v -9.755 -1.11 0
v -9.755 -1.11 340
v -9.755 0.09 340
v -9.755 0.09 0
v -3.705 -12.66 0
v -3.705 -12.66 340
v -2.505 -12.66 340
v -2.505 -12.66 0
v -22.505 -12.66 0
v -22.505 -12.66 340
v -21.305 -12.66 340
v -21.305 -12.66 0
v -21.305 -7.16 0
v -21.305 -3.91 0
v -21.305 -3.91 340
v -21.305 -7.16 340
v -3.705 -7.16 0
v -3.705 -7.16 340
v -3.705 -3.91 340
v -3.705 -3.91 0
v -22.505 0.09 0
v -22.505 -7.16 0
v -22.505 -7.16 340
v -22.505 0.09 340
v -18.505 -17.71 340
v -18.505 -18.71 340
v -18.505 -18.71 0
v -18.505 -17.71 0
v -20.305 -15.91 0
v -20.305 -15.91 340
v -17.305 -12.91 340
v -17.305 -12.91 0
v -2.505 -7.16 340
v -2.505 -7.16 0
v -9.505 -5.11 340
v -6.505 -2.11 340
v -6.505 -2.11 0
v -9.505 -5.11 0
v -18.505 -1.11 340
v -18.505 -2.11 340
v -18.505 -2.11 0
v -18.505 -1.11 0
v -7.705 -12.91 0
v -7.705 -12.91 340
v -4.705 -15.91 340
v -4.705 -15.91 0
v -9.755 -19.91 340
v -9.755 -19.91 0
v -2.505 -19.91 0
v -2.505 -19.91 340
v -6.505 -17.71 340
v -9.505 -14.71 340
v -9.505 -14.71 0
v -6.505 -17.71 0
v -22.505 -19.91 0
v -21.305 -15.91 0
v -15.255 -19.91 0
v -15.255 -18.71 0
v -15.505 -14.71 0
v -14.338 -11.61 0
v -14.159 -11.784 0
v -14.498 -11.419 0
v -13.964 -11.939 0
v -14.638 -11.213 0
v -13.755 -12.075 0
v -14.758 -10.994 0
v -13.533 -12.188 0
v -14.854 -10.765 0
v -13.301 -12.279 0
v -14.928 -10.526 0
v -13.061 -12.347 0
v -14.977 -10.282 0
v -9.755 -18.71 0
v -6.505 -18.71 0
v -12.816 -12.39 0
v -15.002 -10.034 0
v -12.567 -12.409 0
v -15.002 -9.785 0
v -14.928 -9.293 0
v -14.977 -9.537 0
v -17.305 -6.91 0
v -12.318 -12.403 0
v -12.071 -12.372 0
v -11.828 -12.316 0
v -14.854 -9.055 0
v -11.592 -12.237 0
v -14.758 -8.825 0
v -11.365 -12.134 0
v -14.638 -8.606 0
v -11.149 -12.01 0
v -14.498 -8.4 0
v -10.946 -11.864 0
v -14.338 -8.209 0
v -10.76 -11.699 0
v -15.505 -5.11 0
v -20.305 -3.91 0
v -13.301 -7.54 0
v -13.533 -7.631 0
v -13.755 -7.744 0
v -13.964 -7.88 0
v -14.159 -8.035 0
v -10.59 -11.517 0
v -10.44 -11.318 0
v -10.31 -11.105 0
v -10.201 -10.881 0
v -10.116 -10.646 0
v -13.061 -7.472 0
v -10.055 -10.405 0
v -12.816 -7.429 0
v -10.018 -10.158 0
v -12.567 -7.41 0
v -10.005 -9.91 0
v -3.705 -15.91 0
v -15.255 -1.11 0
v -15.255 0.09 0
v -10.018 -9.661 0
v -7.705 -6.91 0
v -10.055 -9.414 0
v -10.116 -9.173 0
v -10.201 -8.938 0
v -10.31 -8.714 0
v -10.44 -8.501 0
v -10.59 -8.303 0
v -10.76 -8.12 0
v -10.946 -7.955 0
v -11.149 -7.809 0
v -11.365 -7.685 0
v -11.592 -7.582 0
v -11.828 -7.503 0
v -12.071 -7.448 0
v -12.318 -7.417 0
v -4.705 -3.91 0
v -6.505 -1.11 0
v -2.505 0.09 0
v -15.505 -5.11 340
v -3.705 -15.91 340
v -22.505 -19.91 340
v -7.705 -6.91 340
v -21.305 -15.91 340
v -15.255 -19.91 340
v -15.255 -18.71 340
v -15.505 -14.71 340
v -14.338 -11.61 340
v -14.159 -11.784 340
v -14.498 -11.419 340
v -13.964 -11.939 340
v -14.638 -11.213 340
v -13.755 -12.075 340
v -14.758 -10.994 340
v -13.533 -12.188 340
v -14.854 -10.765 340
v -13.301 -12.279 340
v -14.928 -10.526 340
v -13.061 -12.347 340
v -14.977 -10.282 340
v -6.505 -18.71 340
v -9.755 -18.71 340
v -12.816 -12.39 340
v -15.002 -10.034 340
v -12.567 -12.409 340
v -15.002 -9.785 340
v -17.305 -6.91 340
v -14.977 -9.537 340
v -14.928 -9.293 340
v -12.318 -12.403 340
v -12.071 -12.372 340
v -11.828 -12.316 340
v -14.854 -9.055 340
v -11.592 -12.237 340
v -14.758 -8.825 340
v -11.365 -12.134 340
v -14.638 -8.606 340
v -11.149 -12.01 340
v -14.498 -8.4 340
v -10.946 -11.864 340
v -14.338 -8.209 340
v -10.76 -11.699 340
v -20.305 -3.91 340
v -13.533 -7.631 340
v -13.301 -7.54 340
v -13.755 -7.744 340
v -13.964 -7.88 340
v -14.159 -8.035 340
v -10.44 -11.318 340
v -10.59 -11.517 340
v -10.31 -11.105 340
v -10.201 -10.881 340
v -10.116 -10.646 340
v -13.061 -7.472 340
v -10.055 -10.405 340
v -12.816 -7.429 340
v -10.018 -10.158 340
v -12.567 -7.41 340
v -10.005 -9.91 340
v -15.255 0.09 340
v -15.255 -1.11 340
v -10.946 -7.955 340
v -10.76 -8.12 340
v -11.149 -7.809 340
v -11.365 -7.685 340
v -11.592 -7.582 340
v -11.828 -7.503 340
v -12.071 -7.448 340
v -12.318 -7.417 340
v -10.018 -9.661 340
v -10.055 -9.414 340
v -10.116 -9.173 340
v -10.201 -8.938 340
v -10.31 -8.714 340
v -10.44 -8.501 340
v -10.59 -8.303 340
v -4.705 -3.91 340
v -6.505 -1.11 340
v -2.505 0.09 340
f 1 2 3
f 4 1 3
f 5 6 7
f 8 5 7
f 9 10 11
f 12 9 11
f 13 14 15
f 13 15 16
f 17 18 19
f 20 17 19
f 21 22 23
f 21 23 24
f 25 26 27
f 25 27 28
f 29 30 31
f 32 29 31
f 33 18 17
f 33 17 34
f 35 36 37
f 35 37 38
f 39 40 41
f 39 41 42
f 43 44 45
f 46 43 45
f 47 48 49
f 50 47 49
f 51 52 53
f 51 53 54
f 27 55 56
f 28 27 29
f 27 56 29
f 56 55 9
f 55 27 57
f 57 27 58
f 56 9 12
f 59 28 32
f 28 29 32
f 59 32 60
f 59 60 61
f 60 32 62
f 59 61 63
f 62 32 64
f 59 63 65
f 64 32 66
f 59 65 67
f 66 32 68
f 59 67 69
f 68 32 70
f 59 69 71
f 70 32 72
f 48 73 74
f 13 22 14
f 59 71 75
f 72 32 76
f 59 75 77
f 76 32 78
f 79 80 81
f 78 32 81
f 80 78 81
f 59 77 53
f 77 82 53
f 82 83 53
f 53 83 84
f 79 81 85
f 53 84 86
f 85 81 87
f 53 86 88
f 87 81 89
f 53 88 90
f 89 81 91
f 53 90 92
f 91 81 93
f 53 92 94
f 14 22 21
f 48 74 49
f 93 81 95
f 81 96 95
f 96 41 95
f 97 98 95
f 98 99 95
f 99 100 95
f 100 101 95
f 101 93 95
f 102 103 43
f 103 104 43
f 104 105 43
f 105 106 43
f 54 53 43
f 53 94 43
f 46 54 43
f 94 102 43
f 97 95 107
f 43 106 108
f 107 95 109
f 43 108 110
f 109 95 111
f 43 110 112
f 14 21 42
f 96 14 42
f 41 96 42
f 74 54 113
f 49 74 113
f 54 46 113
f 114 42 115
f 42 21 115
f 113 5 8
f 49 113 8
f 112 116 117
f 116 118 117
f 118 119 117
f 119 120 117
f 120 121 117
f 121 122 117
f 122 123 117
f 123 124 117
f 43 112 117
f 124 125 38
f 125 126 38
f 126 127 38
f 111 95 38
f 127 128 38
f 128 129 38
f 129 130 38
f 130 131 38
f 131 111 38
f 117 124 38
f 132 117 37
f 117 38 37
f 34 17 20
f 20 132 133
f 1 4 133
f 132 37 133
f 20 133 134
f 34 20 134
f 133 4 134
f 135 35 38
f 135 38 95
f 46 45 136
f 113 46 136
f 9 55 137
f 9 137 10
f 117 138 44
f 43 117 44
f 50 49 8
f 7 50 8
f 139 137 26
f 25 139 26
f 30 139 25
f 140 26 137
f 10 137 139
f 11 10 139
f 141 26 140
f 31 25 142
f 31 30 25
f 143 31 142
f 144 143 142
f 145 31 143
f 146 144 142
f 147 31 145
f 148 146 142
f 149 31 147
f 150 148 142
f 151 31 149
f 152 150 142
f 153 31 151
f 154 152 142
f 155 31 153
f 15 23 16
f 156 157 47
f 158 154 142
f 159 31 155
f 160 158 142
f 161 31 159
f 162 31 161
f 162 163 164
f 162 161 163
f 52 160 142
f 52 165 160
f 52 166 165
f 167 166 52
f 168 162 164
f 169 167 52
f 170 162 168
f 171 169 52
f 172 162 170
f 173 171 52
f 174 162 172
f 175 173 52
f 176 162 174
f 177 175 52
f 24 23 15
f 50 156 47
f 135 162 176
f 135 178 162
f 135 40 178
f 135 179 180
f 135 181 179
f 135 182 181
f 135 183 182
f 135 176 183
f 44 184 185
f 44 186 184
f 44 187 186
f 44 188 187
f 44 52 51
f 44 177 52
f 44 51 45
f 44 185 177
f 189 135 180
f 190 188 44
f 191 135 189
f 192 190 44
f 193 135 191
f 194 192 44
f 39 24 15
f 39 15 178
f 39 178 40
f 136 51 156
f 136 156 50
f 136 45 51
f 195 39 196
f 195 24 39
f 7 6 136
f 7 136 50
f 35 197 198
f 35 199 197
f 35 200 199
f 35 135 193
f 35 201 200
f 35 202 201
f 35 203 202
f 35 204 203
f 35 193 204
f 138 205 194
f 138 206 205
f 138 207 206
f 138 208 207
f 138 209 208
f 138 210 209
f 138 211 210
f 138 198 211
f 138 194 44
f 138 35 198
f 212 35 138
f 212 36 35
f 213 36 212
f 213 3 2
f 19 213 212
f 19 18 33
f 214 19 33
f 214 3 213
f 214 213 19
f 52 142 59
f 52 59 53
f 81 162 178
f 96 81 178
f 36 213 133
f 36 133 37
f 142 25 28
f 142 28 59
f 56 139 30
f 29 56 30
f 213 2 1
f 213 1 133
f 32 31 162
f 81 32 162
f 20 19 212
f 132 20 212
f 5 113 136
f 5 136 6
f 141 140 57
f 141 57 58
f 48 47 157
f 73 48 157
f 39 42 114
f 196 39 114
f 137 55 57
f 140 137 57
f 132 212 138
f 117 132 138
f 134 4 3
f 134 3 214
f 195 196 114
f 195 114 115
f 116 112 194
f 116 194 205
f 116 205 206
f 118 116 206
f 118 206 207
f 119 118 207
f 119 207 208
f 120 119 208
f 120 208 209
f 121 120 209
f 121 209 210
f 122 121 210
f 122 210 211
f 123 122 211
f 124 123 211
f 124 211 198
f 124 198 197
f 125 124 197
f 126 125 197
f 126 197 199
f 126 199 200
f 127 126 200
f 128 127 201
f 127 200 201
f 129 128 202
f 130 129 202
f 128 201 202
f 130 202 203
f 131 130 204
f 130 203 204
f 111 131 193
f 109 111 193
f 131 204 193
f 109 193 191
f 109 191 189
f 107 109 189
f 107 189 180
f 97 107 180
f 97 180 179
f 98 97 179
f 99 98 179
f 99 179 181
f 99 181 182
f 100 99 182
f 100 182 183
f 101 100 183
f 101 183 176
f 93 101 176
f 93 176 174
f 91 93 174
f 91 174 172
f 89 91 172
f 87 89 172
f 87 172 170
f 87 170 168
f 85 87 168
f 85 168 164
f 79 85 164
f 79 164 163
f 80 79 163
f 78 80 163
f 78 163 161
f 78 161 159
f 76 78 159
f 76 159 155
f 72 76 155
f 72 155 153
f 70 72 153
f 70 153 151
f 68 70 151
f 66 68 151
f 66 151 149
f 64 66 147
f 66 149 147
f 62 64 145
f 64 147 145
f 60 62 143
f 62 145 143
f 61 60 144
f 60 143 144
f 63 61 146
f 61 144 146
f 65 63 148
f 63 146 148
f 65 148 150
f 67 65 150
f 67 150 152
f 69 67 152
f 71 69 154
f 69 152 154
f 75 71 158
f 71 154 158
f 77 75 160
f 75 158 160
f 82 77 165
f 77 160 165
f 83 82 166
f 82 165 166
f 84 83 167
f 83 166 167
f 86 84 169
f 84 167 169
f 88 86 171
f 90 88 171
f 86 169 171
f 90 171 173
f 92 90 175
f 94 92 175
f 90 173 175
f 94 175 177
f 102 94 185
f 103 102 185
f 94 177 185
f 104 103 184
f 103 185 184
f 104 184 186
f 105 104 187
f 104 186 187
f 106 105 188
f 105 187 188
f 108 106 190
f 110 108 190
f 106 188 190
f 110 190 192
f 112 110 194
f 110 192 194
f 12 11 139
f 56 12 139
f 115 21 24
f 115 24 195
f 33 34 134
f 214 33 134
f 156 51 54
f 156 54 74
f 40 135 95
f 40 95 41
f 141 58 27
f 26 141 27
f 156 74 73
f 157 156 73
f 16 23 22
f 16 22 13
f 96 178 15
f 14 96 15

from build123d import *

# Parameters (mm, degrees)
ESQUISSE1_W             = 20
ESQUISSE1_H             = 20
BOSS_EXTRU_1_DEPTH      = 340
ESQUISSE2_W             = 1.2
ESQUISSE2_H             = 5.5
ESQUISSE2_W_2           = 5.5
ESQUISSE2_H_2           = 1.2
ENL_V_MAT_EXTRU_1_DEPTH = 341
ENL_V_MAT_EXTRU_2_DEPTH = 341
ESQUISSE4_R             = 2.5
ENL_V_MAT_EXTRU_3_DEPTH = 341


with BuildPart() as part:
    # Esquisse1 → Boss.-Extru.1 (new body)
    with BuildSketch(Plane.XY):
        with Locations((-12.505109137, -9.909560068)):
            Rectangle(ESQUISSE1_W, ESQUISSE1_H)
    extrude(amount=BOSS_EXTRU_1_DEPTH)

    # Esquisse2 → Enlèv. mat.-Extru.1 (cut, through all)
    with BuildSketch(Plane.XY.offset(340)):
        with Locations((-21.905109137, -9.909560068)):
            Rectangle(ESQUISSE2_W, ESQUISSE2_H)
        with Locations((-12.505109137, -0.509560068)):
            Rectangle(ESQUISSE2_W_2, ESQUISSE2_H_2)
        with Locations((-3.105109137, -9.909560068)):
            Rectangle(ESQUISSE2_W, ESQUISSE2_H)
        with Locations((-12.505109137, -19.309560068)):
            Rectangle(ESQUISSE2_W_2, ESQUISSE2_H_2)
    extrude(amount=-ENL_V_MAT_EXTRU_1_DEPTH, mode=Mode.SUBTRACT)

    # Esquisse3 → Enlèv. mat.-Extru.2 (cut, through all)
    with BuildSketch(Plane.XY.offset(340)):
        Polygon((-21.305109137, -15.909560068), (-20.305109137, -15.909560068), (-17.305109137, -12.909560068), (-17.305109137, -6.909560068), (-20.305109137, -3.909560068), (-21.305109137, -3.909560068), align=None)
        Polygon((-18.505109137, -1.109560068), (-6.505109137, -1.109560068), (-6.505109137, -2.109560068), (-9.505109137, -5.109560068), (-15.505109137, -5.109560068), (-18.505109137, -2.109560068), align=None)
        Polygon((-3.705109137, -3.909560068), (-4.705109137, -3.909560068), (-7.705109137, -6.909560068), (-7.705109137, -12.909560068), (-4.705109137, -15.909560068), (-3.705109137, -15.909560068), align=None)
        Polygon((-6.505109137, -18.709560068), (-18.505109137, -18.709560068), (-18.505109137, -17.709560068), (-15.505109137, -14.709560068), (-9.505109137, -14.709560068), (-6.505109137, -17.709560068), align=None)
    extrude(amount=-ENL_V_MAT_EXTRU_2_DEPTH, mode=Mode.SUBTRACT)

    # Esquisse4 → Enlèv. mat.-Extru.3 (cut, through all)
    with BuildSketch(Plane.XY.offset(340)):
        with Locations((-12.505109137, -9.909560068)):
            Circle(ESQUISSE4_R)
    extrude(amount=-ENL_V_MAT_EXTRU_3_DEPTH, mode=Mode.SUBTRACT)


solid = part.part
